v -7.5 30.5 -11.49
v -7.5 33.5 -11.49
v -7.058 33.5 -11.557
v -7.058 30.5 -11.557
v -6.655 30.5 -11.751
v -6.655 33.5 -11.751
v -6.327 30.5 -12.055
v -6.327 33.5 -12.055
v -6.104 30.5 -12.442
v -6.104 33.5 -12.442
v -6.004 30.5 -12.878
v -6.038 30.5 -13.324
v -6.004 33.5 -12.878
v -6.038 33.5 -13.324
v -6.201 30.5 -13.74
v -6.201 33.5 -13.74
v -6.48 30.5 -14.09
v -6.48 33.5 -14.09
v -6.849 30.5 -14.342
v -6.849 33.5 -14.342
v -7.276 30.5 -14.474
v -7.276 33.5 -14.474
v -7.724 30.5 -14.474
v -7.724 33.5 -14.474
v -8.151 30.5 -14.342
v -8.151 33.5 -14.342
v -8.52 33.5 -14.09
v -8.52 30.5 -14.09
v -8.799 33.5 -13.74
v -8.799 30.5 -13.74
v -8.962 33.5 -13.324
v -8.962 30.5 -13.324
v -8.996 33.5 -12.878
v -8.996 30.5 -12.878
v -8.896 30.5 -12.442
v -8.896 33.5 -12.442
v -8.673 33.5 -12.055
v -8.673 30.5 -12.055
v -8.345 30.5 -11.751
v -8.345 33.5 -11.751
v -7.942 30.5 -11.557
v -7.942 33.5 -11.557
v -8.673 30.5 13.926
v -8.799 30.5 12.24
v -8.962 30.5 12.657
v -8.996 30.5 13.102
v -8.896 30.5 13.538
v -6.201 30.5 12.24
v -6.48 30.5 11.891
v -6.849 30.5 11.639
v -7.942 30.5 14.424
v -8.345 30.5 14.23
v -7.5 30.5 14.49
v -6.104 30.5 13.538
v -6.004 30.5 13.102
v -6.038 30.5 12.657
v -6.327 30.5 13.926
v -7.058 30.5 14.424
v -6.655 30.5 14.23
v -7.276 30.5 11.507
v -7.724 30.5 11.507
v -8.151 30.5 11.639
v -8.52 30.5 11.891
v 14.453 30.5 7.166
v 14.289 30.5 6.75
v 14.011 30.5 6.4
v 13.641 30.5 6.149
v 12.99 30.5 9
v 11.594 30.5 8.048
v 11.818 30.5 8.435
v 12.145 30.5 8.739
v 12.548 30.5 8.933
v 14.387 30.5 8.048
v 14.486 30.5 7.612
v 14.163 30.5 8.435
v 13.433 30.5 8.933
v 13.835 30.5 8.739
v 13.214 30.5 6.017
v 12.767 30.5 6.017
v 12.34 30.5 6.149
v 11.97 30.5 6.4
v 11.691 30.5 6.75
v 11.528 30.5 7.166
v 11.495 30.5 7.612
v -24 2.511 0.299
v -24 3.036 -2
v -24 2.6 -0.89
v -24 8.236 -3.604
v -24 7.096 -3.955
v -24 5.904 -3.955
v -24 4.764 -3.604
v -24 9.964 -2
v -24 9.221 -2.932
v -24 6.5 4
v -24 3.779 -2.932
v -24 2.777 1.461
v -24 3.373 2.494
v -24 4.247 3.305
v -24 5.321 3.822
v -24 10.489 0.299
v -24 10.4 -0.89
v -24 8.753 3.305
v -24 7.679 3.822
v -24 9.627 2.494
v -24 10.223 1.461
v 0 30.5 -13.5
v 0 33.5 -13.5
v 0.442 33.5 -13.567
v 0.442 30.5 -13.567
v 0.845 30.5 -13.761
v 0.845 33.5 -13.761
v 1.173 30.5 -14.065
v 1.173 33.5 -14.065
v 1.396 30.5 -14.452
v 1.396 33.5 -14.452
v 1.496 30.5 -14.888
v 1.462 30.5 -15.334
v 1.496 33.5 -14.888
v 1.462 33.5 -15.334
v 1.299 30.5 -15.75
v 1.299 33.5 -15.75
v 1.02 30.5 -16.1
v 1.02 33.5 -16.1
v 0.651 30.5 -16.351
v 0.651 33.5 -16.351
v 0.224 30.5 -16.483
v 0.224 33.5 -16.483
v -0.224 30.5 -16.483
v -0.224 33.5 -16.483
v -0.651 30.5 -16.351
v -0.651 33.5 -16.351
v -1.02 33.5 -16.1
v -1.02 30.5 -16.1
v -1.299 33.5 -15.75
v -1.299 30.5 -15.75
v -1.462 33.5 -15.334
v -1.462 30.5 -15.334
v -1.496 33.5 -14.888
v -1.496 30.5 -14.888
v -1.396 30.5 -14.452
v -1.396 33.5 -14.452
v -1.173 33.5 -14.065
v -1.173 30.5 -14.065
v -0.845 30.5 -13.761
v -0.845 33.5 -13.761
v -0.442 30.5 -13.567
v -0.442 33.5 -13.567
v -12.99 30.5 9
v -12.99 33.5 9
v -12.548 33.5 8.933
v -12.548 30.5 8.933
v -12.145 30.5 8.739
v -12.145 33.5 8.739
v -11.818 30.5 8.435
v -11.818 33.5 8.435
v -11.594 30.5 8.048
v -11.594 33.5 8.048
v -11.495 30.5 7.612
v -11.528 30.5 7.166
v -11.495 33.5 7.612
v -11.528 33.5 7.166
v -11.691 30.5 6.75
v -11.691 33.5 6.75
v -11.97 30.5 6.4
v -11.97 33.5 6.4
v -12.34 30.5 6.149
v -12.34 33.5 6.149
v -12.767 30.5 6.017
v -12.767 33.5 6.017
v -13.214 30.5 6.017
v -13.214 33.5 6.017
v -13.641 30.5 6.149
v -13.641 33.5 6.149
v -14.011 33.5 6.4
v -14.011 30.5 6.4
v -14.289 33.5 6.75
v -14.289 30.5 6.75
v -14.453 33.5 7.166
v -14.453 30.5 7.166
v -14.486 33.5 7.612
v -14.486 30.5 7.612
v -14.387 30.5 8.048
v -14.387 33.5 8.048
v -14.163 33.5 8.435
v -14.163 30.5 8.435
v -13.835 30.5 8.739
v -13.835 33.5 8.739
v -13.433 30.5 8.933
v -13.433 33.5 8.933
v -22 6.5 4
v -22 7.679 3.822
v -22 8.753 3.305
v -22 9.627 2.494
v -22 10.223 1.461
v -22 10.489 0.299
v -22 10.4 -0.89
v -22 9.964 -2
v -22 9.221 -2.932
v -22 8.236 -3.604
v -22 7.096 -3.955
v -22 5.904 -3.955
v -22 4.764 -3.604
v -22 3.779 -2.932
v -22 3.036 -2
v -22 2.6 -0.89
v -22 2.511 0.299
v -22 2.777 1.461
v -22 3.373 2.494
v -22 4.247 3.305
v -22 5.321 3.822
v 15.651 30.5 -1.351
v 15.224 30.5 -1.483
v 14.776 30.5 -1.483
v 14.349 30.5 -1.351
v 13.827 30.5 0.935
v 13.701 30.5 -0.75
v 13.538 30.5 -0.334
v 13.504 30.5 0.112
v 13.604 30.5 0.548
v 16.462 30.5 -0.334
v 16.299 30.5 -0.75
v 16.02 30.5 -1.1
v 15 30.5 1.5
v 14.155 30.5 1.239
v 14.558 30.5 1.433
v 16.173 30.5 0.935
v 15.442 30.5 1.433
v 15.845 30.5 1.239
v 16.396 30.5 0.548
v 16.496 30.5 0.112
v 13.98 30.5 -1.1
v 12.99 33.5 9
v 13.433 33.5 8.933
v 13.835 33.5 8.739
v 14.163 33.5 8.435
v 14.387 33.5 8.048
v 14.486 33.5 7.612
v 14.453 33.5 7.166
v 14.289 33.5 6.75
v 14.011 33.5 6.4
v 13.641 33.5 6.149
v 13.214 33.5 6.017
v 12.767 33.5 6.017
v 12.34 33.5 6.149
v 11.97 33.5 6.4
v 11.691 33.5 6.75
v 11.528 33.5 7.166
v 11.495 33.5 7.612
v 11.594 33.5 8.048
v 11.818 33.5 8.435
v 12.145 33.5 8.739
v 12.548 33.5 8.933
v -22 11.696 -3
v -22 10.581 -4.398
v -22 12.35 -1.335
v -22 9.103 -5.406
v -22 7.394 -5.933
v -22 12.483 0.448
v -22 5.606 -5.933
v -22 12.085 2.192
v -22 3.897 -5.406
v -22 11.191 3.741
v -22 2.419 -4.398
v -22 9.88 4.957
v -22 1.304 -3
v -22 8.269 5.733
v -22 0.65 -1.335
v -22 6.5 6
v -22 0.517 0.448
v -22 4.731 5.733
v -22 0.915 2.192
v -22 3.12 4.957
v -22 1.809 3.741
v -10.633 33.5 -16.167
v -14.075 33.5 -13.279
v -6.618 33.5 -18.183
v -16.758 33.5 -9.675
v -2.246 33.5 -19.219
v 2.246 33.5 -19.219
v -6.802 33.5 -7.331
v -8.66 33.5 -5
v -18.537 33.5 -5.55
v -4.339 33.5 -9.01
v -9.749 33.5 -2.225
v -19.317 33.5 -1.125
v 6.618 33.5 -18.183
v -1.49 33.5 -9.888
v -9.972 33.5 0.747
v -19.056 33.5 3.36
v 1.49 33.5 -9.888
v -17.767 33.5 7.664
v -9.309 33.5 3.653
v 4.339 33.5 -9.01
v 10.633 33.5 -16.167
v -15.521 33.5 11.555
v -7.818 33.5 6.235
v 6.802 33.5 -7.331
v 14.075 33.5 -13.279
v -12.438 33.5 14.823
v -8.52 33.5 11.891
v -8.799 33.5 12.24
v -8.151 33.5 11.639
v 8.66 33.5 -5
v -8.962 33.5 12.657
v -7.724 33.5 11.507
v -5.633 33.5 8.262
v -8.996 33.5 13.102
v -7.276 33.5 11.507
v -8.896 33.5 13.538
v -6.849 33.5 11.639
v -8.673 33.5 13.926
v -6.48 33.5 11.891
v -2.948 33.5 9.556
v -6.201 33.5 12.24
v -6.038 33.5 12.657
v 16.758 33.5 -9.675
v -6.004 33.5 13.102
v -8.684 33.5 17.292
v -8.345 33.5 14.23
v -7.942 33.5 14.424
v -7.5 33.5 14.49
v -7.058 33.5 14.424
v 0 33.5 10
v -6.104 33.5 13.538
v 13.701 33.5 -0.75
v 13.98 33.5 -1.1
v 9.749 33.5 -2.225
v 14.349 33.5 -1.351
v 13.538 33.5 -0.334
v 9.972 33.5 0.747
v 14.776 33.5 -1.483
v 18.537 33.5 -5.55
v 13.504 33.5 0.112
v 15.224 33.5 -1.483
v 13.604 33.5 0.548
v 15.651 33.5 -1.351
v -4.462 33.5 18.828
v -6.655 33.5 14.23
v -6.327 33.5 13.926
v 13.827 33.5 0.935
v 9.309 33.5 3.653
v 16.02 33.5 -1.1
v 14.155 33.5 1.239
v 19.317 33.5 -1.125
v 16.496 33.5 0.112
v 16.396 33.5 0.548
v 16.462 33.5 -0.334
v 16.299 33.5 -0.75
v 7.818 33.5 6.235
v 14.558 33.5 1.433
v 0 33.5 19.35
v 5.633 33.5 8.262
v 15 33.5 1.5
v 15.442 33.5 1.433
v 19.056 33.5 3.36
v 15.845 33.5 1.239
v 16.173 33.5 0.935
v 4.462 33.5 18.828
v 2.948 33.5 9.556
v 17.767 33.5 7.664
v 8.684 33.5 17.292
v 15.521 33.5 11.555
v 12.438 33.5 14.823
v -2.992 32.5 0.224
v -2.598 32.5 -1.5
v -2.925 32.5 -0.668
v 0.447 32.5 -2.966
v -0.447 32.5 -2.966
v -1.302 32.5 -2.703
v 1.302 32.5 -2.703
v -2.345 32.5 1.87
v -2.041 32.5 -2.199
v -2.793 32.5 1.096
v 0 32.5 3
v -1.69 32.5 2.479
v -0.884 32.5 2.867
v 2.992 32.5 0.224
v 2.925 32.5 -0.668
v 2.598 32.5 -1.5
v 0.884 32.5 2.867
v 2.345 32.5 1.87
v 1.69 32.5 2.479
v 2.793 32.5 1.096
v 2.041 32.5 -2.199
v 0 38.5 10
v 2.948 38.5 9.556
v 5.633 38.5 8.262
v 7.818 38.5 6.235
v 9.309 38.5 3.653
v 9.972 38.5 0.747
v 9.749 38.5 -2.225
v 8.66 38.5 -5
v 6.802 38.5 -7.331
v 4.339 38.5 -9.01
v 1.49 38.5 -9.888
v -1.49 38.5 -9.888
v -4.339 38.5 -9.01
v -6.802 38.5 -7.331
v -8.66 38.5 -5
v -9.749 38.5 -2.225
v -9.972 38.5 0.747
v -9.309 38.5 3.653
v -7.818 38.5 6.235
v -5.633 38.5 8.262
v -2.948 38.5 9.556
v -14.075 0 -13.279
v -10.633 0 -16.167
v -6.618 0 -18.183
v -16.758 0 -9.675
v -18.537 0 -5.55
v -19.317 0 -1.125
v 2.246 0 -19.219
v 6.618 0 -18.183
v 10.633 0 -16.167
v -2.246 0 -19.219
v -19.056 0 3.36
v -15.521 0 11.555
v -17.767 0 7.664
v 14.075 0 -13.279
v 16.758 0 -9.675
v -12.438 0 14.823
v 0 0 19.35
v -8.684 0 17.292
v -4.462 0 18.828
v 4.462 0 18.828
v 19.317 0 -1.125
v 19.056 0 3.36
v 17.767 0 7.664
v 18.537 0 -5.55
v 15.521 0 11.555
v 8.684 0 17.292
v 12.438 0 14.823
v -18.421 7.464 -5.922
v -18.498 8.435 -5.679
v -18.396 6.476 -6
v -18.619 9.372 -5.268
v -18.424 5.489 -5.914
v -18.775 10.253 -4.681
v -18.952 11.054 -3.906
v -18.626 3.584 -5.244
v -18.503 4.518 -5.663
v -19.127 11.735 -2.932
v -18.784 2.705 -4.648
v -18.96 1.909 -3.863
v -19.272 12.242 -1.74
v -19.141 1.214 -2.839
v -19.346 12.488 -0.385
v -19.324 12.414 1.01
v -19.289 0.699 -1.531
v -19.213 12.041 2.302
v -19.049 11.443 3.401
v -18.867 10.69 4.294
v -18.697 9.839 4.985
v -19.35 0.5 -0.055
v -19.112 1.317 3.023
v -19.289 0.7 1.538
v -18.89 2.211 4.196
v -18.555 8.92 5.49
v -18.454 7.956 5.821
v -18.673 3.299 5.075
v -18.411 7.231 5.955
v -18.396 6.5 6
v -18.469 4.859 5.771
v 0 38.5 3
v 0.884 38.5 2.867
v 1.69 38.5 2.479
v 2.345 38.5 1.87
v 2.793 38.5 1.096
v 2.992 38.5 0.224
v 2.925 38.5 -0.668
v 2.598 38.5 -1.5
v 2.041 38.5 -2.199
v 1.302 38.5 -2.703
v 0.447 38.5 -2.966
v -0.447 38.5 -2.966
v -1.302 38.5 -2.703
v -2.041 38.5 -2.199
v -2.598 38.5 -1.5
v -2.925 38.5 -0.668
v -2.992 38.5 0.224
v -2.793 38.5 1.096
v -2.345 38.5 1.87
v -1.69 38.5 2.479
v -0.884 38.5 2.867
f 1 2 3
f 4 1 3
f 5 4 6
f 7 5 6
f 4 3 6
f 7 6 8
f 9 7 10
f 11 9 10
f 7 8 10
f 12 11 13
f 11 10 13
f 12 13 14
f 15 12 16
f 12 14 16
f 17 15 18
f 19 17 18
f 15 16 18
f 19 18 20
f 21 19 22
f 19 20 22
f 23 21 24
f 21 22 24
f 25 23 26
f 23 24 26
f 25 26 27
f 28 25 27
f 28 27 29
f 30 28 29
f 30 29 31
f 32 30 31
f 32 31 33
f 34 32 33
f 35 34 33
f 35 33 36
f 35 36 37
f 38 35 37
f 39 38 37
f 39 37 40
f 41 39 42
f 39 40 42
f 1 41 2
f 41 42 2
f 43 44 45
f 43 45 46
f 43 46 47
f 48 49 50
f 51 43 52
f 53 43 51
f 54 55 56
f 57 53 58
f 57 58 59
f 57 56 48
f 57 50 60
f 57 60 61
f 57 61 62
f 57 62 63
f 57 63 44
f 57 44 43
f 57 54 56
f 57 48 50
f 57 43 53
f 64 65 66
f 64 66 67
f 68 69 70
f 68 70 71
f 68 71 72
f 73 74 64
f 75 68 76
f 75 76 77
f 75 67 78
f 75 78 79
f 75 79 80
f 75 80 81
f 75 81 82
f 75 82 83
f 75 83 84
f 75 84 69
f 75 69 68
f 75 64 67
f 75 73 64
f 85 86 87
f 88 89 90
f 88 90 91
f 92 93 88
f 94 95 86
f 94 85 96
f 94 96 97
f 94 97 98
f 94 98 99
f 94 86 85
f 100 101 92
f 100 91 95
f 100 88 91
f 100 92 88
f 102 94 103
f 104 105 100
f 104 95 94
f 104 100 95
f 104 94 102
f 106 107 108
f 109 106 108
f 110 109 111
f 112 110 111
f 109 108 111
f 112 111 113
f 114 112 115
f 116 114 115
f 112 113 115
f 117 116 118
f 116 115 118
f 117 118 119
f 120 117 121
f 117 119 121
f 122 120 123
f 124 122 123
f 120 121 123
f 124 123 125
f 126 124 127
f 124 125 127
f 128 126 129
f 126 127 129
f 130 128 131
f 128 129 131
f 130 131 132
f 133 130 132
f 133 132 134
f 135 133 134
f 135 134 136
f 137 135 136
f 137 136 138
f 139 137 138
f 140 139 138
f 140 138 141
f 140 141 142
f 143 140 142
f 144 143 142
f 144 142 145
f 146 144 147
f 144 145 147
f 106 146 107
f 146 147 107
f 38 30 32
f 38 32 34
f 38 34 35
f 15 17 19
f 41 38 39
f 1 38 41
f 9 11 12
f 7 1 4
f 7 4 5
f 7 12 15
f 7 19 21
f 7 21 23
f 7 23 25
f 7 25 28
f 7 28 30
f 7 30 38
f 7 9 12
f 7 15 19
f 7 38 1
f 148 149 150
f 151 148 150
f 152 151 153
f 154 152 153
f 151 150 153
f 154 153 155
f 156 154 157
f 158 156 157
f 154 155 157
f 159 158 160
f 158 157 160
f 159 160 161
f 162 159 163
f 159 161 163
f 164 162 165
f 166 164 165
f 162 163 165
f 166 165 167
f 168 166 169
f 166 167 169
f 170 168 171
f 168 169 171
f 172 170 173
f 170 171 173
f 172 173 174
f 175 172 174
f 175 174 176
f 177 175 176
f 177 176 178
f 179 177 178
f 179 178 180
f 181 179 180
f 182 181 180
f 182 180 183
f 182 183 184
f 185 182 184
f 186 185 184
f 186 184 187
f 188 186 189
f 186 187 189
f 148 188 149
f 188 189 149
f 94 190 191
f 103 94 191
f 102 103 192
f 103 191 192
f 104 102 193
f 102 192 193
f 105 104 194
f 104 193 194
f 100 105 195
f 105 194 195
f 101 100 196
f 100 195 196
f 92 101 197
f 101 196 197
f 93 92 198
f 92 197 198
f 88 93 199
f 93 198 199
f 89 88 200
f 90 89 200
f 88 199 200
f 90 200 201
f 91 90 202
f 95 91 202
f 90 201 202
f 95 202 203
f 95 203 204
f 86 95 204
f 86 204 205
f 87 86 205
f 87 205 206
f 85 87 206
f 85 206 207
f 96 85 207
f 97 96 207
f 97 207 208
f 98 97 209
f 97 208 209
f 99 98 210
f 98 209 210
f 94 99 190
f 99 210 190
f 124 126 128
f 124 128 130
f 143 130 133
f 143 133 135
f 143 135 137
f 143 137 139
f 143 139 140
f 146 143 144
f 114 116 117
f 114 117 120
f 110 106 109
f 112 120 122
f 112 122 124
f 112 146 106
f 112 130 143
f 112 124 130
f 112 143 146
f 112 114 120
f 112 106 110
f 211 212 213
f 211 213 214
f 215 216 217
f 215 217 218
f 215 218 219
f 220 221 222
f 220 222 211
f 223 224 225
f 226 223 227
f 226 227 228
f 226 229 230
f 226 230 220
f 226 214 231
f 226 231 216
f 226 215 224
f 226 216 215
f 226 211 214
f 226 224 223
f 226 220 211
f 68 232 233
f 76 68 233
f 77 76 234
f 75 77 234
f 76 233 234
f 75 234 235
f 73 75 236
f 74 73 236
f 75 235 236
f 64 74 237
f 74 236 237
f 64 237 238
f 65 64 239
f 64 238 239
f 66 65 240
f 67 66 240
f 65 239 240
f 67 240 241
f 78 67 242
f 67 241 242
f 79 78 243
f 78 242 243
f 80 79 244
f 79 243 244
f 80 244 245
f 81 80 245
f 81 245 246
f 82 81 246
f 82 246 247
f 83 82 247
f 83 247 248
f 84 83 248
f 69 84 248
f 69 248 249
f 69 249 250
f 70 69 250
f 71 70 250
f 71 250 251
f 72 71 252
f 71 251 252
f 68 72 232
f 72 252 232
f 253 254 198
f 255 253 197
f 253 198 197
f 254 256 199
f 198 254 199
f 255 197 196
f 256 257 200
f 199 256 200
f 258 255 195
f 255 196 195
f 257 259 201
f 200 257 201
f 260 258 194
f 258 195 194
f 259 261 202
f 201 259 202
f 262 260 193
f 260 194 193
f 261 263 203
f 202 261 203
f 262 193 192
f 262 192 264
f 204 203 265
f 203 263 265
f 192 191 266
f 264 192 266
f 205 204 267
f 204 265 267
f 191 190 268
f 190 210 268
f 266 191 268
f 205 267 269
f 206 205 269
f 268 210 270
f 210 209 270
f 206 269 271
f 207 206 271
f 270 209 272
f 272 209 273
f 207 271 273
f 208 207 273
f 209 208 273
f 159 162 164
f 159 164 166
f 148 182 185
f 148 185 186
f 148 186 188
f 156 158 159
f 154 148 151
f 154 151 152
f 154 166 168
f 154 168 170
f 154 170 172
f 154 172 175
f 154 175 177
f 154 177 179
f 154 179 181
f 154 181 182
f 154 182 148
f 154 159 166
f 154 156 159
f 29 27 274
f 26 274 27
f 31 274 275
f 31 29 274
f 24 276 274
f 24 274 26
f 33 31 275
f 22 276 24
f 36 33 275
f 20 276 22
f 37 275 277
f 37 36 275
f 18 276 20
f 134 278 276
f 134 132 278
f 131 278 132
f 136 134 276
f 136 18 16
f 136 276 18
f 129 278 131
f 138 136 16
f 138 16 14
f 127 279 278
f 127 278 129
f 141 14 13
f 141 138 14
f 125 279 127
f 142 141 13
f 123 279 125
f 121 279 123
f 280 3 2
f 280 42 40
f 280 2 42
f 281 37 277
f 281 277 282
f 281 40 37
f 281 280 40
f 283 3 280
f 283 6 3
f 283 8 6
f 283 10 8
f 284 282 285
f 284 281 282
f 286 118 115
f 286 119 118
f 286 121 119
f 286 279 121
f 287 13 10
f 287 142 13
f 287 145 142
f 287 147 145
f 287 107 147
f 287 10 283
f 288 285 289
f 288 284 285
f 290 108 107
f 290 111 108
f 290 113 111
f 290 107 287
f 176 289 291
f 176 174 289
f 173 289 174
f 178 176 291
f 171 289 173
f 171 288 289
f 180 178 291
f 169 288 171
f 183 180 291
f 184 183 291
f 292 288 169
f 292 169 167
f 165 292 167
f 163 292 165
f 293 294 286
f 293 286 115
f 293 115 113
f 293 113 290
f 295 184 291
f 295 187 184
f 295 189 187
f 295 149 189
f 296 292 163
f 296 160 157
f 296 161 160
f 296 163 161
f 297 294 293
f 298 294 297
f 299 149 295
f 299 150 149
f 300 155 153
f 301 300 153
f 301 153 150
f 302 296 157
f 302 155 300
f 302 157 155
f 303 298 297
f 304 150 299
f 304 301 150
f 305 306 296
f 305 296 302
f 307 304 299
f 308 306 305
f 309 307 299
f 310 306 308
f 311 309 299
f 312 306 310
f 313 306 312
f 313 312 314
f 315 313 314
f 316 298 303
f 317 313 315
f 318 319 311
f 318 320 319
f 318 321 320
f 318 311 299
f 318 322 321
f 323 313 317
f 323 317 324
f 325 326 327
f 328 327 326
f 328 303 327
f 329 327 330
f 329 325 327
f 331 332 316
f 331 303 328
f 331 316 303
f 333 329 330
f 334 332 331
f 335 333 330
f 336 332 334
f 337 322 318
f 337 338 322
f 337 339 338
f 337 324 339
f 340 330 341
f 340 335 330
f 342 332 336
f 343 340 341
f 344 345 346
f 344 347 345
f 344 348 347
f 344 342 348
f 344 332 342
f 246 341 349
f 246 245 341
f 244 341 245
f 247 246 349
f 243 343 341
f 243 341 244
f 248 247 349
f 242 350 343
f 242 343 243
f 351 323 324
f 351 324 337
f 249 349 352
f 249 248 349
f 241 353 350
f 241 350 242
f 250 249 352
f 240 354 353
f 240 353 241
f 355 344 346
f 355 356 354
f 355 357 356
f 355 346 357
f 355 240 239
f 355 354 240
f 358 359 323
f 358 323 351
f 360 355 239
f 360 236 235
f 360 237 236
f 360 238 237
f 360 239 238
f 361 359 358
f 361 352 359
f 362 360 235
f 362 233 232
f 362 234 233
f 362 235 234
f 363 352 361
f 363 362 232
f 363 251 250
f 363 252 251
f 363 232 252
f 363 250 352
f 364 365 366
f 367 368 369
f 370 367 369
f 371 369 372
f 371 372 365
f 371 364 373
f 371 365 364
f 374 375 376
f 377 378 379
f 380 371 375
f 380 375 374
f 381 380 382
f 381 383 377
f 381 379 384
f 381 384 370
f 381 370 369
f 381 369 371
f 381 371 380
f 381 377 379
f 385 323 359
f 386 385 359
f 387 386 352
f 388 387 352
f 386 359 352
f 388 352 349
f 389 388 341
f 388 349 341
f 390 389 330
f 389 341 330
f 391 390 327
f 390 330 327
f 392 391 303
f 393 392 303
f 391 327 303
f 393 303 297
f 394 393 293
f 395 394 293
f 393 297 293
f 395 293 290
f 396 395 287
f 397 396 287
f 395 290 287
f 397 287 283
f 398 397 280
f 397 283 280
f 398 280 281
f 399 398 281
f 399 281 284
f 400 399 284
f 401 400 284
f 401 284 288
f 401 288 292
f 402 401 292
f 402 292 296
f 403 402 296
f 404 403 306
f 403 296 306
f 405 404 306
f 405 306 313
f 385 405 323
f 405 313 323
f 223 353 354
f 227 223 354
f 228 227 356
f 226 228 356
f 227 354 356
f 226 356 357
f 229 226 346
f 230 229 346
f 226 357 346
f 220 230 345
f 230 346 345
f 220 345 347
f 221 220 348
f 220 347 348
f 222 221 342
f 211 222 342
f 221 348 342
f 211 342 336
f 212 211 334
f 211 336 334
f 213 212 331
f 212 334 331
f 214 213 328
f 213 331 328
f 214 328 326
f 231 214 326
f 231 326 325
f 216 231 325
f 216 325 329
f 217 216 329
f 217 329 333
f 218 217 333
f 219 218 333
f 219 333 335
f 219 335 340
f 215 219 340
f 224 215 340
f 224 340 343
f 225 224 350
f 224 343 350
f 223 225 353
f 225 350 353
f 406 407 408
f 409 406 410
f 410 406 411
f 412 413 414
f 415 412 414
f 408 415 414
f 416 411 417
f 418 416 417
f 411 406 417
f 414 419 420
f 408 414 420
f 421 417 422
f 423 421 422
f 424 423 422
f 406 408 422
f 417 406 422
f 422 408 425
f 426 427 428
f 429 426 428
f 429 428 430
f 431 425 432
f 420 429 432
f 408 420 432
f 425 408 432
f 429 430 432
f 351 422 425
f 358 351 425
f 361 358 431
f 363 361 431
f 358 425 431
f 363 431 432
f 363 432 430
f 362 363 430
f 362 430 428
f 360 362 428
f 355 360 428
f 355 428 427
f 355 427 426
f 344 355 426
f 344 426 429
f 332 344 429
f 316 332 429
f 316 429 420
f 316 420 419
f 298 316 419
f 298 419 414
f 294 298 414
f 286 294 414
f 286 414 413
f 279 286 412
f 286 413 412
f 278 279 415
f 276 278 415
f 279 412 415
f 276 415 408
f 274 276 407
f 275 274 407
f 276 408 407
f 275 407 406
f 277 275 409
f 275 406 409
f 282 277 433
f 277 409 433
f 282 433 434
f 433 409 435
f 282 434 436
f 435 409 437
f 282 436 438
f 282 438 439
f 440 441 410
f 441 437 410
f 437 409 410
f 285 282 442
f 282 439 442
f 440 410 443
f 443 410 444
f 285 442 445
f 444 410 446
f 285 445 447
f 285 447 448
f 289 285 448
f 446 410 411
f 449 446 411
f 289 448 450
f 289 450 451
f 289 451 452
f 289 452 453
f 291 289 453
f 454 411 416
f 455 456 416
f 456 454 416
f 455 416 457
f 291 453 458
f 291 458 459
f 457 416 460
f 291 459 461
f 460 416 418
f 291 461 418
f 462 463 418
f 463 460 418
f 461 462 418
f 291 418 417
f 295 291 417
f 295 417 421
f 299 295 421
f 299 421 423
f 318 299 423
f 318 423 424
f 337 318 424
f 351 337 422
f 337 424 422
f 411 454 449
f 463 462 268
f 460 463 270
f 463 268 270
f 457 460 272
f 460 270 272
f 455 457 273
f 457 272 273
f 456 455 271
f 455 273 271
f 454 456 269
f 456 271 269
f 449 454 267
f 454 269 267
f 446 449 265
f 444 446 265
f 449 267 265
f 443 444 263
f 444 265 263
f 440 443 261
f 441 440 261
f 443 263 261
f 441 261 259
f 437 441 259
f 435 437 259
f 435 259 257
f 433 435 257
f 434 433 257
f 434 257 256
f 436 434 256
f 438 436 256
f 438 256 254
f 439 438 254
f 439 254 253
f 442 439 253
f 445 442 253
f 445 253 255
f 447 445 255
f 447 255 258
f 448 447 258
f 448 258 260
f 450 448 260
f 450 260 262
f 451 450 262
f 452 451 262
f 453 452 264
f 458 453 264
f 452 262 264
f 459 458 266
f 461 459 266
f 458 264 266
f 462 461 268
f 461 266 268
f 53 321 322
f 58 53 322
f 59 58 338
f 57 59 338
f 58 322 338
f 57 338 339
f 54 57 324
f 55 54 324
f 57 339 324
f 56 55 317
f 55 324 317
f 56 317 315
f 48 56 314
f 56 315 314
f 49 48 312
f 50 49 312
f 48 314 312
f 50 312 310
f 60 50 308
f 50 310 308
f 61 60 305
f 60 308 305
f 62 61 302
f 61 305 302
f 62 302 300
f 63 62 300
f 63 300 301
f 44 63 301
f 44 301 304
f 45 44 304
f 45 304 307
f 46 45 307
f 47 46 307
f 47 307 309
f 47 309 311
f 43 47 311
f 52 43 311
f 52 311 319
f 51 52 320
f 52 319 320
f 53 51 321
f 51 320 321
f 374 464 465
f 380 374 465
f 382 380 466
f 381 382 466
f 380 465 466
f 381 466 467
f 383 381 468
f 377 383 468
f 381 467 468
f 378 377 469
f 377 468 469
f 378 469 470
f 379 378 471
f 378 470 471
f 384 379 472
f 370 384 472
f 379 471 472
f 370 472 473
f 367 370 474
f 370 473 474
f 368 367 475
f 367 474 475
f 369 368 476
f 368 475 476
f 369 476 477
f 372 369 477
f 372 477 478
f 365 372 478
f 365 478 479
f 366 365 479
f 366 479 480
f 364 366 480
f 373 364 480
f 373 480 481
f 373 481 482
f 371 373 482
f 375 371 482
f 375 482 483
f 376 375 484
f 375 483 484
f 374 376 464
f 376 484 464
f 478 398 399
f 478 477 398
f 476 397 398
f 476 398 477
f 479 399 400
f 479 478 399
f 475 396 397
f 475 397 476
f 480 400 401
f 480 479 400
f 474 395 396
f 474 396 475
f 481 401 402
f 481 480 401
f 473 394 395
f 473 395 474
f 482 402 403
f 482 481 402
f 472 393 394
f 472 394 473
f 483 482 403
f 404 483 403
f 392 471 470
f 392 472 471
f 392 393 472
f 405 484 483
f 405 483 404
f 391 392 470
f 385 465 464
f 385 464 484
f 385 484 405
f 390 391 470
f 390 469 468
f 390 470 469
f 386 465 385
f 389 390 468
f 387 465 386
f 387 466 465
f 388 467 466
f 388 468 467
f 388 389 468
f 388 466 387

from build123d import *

# Parameters (mm, degrees)
SKETCH2_R                = 19.35
BOSS_EXTRUDE1_DEPTH      = 33.5
SKETCH3_R                = 10
BOSS_EXTRUDE2_DEPTH      = 5
SKETCH4_R                = 1.5
CUT_EXTRUDE1_DEPTH       = 3
SKETCH5_R                = 3
CUT_EXTRUDE2_DEPTH       = 6
BOSS_EXTRUDE3_REACH      = 61.72
BOSS_EXTRUDE3_END_RADIUS = 19.35
SKETCH6_R                = 6
SKETCH7_R                = 4
BOSS_EXTRUDE4_DEPTH      = 2


with BuildPart() as part:
    # Sketch2 → Boss-Extrude1 (new body)
    with BuildSketch(Plane(origin=(0, 0, 0), x_dir=(1, 0, 0), z_dir=(0, 1, 0))):
        with Locations(Location((0, 0, 0), (0, 0, 270))):
            Circle(SKETCH2_R)
    extrude(amount=BOSS_EXTRUDE1_DEPTH)

    # Sketch3 → Boss-Extrude2 (add)
    with BuildSketch(Plane(origin=(0, 33.5, 0), x_dir=(1, 0, 0), z_dir=(0, 1, 0))):
        with Locations(Location((0, 0, 0), (0, 0, 270))):
            Circle(SKETCH3_R)
    extrude(amount=BOSS_EXTRUDE2_DEPTH)

    # Sketch4 → Cut-Extrude1 (cut)
    with BuildSketch(Plane(origin=(0, 33.5, 0), x_dir=(1, 0, 0), z_dir=(0, 1, 0))):
        with Locations(Location((15, 0, 0), (0, 0, 270))):
            Circle(SKETCH4_R)
        with Locations(Location((12.990381057, -7.5, 0), (0, 0, 270))):
            Circle(SKETCH4_R)
        with Locations(Location((0, 15, 0), (0, 0, 270))):
            Circle(SKETCH4_R)
        with Locations(Location((-12.990381057, -7.5, 0), (0, 0, 270))):
            Circle(SKETCH4_R)
        with Locations(Location((-7.5, -12.990381057, 0), (0, 0, 270))):
            Circle(SKETCH4_R)
        with Locations(Location((-7.5, 12.990381057, 0), (0, 0, 270))):
            Circle(SKETCH4_R)
    extrude(amount=-CUT_EXTRUDE1_DEPTH, mode=Mode.SUBTRACT)

    # Sketch5 → Cut-Extrude2 (cut)
    with BuildSketch(Plane(origin=(0, 38.5, 0), x_dir=(1, 0, 0), z_dir=(0, 1, 0))):
        with Locations(Location((0, 0, 0), (0, 0, 270))):
            Circle(SKETCH5_R)
    extrude(amount=-CUT_EXTRUDE2_DEPTH, mode=Mode.SUBTRACT)

    # Boss-Extrude3: up to this cylinder (the profile starts outside it)
    boss_extrude3_end = Plane(origin=(0, 6.5, 0), z_dir=(0, -1, 0)) * Cylinder(BOSS_EXTRUDE3_END_RADIUS, 163.14, mode=Mode.PRIVATE)
    # Sketch6 → Boss-Extrude3 (add, up to the surface)
    with BuildSketch(Plane(origin=(-22, 0, 0), x_dir=(0, 0, -1), z_dir=(1, 0, 0)), mode=Mode.PRIVATE) as boss_extrude3_sk1:
        with Locations(Location((0, 6.5, 0), (0, 0, 180))):
            Circle(SKETCH6_R)
    boss_extrude3_tool1 = extrude(boss_extrude3_sk1.sketch, amount=BOSS_EXTRUDE3_REACH, mode=Mode.PRIVATE) - boss_extrude3_end
    add(boss_extrude3_tool1.solids().sort_by_distance((-22, 6.5, 0))[0])

    # Sketch7 → Boss-Extrude4 (add)
    with BuildSketch(Plane.ZY.offset(22)):
        with Locations((0, 6.5)):
            Circle(SKETCH7_R)
    extrude(amount=BOSS_EXTRUDE4_DEPTH)


solid = part.part
